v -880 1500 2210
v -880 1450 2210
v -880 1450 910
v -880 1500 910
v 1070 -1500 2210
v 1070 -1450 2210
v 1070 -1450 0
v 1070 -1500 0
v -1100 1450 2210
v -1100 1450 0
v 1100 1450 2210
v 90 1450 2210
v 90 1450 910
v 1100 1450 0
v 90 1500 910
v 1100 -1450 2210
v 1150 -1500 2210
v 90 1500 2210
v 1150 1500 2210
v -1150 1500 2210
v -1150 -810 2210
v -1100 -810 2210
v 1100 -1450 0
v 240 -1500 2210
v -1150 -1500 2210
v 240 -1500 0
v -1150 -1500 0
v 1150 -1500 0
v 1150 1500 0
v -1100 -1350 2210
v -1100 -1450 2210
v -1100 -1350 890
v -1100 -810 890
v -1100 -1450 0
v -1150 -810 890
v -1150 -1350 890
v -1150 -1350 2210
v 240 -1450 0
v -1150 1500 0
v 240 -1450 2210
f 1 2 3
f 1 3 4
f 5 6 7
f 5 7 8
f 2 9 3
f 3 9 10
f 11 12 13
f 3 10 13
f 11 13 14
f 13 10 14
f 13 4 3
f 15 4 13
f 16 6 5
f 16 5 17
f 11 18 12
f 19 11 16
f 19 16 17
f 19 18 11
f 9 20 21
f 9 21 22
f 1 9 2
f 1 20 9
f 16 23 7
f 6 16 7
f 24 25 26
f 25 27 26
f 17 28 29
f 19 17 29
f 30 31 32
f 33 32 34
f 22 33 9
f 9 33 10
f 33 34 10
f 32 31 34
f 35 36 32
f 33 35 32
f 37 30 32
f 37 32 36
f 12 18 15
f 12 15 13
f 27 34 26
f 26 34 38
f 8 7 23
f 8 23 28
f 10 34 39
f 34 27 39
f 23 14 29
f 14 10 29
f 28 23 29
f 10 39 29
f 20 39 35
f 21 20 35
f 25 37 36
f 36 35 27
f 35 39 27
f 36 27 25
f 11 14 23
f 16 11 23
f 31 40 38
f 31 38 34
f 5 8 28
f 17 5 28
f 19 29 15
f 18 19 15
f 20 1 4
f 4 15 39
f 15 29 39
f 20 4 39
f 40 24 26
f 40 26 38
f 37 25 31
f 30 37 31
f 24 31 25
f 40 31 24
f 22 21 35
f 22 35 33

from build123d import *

# Parameters (mm, degrees)
F1_DEPTH = 890
F3_DEPTH = 20
F5_DEPTH = 1300


with BuildPart() as f1:
    # F0 (on Top) → F1 (new body)
    with BuildSketch(Plane.XY):
        Polygon((1100, 1450), (1100, -1450), (1070, -1450), (1070, -1500), (1150, -1500), (1150, 1500), (-1150, 1500), (-1150, -1500), (240, -1500), (240, -1450), (-1100, -1450), (-1100, 1450), align=None)
    extrude(amount=F1_DEPTH)

    # F2 (on face) → F3 (join)
    with BuildSketch(Plane.XY.offset(890)):
        Polygon((-1100, -1350), (-1150, -1350), (-1150, -1500), (240, -1500), (240, -1450), (-1100, -1450), align=None)
        Polygon((-1150, 1500), (-1150, -810), (-1100, -810), (-1100, 1450), (1100, 1450), (1100, -1450), (1070, -1450), (1070, -1500), (1150, -1500), (1150, 1500), align=None)
    extrude(amount=F3_DEPTH)

    # F3_face (on face) + F4 (on face) → F5 (join)
    with BuildSketch(Plane(origin=(107.2679045093, 530.198938992, 910), x_dir=(1, 0, 0), z_dir=(0, 0, 1))):
        Polygon((-1207.2679045093, -1880.198938992), (-1257.2679045093, -1880.198938992), (-1257.2679045093, -2030.198938992), (132.7320954907, -2030.198938992), (132.7320954907, -1980.198938992), (-1207.2679045093, -1980.198938992), align=None)
    with BuildSketch(Plane.XY.offset(910)):
        Polygon((-880, 1450), (-880, 1500), (-1150, 1500), (-1150, -810), (-1100, -810), (-1100, 1450), align=None)
        Polygon((1150, 1500), (90, 1500), (90, 1450), (1100, 1450), (1100, -1450), (1070, -1450), (1070, -1500), (1150, -1500), align=None)
    extrude(amount=F5_DEPTH)


solid = f1.part
